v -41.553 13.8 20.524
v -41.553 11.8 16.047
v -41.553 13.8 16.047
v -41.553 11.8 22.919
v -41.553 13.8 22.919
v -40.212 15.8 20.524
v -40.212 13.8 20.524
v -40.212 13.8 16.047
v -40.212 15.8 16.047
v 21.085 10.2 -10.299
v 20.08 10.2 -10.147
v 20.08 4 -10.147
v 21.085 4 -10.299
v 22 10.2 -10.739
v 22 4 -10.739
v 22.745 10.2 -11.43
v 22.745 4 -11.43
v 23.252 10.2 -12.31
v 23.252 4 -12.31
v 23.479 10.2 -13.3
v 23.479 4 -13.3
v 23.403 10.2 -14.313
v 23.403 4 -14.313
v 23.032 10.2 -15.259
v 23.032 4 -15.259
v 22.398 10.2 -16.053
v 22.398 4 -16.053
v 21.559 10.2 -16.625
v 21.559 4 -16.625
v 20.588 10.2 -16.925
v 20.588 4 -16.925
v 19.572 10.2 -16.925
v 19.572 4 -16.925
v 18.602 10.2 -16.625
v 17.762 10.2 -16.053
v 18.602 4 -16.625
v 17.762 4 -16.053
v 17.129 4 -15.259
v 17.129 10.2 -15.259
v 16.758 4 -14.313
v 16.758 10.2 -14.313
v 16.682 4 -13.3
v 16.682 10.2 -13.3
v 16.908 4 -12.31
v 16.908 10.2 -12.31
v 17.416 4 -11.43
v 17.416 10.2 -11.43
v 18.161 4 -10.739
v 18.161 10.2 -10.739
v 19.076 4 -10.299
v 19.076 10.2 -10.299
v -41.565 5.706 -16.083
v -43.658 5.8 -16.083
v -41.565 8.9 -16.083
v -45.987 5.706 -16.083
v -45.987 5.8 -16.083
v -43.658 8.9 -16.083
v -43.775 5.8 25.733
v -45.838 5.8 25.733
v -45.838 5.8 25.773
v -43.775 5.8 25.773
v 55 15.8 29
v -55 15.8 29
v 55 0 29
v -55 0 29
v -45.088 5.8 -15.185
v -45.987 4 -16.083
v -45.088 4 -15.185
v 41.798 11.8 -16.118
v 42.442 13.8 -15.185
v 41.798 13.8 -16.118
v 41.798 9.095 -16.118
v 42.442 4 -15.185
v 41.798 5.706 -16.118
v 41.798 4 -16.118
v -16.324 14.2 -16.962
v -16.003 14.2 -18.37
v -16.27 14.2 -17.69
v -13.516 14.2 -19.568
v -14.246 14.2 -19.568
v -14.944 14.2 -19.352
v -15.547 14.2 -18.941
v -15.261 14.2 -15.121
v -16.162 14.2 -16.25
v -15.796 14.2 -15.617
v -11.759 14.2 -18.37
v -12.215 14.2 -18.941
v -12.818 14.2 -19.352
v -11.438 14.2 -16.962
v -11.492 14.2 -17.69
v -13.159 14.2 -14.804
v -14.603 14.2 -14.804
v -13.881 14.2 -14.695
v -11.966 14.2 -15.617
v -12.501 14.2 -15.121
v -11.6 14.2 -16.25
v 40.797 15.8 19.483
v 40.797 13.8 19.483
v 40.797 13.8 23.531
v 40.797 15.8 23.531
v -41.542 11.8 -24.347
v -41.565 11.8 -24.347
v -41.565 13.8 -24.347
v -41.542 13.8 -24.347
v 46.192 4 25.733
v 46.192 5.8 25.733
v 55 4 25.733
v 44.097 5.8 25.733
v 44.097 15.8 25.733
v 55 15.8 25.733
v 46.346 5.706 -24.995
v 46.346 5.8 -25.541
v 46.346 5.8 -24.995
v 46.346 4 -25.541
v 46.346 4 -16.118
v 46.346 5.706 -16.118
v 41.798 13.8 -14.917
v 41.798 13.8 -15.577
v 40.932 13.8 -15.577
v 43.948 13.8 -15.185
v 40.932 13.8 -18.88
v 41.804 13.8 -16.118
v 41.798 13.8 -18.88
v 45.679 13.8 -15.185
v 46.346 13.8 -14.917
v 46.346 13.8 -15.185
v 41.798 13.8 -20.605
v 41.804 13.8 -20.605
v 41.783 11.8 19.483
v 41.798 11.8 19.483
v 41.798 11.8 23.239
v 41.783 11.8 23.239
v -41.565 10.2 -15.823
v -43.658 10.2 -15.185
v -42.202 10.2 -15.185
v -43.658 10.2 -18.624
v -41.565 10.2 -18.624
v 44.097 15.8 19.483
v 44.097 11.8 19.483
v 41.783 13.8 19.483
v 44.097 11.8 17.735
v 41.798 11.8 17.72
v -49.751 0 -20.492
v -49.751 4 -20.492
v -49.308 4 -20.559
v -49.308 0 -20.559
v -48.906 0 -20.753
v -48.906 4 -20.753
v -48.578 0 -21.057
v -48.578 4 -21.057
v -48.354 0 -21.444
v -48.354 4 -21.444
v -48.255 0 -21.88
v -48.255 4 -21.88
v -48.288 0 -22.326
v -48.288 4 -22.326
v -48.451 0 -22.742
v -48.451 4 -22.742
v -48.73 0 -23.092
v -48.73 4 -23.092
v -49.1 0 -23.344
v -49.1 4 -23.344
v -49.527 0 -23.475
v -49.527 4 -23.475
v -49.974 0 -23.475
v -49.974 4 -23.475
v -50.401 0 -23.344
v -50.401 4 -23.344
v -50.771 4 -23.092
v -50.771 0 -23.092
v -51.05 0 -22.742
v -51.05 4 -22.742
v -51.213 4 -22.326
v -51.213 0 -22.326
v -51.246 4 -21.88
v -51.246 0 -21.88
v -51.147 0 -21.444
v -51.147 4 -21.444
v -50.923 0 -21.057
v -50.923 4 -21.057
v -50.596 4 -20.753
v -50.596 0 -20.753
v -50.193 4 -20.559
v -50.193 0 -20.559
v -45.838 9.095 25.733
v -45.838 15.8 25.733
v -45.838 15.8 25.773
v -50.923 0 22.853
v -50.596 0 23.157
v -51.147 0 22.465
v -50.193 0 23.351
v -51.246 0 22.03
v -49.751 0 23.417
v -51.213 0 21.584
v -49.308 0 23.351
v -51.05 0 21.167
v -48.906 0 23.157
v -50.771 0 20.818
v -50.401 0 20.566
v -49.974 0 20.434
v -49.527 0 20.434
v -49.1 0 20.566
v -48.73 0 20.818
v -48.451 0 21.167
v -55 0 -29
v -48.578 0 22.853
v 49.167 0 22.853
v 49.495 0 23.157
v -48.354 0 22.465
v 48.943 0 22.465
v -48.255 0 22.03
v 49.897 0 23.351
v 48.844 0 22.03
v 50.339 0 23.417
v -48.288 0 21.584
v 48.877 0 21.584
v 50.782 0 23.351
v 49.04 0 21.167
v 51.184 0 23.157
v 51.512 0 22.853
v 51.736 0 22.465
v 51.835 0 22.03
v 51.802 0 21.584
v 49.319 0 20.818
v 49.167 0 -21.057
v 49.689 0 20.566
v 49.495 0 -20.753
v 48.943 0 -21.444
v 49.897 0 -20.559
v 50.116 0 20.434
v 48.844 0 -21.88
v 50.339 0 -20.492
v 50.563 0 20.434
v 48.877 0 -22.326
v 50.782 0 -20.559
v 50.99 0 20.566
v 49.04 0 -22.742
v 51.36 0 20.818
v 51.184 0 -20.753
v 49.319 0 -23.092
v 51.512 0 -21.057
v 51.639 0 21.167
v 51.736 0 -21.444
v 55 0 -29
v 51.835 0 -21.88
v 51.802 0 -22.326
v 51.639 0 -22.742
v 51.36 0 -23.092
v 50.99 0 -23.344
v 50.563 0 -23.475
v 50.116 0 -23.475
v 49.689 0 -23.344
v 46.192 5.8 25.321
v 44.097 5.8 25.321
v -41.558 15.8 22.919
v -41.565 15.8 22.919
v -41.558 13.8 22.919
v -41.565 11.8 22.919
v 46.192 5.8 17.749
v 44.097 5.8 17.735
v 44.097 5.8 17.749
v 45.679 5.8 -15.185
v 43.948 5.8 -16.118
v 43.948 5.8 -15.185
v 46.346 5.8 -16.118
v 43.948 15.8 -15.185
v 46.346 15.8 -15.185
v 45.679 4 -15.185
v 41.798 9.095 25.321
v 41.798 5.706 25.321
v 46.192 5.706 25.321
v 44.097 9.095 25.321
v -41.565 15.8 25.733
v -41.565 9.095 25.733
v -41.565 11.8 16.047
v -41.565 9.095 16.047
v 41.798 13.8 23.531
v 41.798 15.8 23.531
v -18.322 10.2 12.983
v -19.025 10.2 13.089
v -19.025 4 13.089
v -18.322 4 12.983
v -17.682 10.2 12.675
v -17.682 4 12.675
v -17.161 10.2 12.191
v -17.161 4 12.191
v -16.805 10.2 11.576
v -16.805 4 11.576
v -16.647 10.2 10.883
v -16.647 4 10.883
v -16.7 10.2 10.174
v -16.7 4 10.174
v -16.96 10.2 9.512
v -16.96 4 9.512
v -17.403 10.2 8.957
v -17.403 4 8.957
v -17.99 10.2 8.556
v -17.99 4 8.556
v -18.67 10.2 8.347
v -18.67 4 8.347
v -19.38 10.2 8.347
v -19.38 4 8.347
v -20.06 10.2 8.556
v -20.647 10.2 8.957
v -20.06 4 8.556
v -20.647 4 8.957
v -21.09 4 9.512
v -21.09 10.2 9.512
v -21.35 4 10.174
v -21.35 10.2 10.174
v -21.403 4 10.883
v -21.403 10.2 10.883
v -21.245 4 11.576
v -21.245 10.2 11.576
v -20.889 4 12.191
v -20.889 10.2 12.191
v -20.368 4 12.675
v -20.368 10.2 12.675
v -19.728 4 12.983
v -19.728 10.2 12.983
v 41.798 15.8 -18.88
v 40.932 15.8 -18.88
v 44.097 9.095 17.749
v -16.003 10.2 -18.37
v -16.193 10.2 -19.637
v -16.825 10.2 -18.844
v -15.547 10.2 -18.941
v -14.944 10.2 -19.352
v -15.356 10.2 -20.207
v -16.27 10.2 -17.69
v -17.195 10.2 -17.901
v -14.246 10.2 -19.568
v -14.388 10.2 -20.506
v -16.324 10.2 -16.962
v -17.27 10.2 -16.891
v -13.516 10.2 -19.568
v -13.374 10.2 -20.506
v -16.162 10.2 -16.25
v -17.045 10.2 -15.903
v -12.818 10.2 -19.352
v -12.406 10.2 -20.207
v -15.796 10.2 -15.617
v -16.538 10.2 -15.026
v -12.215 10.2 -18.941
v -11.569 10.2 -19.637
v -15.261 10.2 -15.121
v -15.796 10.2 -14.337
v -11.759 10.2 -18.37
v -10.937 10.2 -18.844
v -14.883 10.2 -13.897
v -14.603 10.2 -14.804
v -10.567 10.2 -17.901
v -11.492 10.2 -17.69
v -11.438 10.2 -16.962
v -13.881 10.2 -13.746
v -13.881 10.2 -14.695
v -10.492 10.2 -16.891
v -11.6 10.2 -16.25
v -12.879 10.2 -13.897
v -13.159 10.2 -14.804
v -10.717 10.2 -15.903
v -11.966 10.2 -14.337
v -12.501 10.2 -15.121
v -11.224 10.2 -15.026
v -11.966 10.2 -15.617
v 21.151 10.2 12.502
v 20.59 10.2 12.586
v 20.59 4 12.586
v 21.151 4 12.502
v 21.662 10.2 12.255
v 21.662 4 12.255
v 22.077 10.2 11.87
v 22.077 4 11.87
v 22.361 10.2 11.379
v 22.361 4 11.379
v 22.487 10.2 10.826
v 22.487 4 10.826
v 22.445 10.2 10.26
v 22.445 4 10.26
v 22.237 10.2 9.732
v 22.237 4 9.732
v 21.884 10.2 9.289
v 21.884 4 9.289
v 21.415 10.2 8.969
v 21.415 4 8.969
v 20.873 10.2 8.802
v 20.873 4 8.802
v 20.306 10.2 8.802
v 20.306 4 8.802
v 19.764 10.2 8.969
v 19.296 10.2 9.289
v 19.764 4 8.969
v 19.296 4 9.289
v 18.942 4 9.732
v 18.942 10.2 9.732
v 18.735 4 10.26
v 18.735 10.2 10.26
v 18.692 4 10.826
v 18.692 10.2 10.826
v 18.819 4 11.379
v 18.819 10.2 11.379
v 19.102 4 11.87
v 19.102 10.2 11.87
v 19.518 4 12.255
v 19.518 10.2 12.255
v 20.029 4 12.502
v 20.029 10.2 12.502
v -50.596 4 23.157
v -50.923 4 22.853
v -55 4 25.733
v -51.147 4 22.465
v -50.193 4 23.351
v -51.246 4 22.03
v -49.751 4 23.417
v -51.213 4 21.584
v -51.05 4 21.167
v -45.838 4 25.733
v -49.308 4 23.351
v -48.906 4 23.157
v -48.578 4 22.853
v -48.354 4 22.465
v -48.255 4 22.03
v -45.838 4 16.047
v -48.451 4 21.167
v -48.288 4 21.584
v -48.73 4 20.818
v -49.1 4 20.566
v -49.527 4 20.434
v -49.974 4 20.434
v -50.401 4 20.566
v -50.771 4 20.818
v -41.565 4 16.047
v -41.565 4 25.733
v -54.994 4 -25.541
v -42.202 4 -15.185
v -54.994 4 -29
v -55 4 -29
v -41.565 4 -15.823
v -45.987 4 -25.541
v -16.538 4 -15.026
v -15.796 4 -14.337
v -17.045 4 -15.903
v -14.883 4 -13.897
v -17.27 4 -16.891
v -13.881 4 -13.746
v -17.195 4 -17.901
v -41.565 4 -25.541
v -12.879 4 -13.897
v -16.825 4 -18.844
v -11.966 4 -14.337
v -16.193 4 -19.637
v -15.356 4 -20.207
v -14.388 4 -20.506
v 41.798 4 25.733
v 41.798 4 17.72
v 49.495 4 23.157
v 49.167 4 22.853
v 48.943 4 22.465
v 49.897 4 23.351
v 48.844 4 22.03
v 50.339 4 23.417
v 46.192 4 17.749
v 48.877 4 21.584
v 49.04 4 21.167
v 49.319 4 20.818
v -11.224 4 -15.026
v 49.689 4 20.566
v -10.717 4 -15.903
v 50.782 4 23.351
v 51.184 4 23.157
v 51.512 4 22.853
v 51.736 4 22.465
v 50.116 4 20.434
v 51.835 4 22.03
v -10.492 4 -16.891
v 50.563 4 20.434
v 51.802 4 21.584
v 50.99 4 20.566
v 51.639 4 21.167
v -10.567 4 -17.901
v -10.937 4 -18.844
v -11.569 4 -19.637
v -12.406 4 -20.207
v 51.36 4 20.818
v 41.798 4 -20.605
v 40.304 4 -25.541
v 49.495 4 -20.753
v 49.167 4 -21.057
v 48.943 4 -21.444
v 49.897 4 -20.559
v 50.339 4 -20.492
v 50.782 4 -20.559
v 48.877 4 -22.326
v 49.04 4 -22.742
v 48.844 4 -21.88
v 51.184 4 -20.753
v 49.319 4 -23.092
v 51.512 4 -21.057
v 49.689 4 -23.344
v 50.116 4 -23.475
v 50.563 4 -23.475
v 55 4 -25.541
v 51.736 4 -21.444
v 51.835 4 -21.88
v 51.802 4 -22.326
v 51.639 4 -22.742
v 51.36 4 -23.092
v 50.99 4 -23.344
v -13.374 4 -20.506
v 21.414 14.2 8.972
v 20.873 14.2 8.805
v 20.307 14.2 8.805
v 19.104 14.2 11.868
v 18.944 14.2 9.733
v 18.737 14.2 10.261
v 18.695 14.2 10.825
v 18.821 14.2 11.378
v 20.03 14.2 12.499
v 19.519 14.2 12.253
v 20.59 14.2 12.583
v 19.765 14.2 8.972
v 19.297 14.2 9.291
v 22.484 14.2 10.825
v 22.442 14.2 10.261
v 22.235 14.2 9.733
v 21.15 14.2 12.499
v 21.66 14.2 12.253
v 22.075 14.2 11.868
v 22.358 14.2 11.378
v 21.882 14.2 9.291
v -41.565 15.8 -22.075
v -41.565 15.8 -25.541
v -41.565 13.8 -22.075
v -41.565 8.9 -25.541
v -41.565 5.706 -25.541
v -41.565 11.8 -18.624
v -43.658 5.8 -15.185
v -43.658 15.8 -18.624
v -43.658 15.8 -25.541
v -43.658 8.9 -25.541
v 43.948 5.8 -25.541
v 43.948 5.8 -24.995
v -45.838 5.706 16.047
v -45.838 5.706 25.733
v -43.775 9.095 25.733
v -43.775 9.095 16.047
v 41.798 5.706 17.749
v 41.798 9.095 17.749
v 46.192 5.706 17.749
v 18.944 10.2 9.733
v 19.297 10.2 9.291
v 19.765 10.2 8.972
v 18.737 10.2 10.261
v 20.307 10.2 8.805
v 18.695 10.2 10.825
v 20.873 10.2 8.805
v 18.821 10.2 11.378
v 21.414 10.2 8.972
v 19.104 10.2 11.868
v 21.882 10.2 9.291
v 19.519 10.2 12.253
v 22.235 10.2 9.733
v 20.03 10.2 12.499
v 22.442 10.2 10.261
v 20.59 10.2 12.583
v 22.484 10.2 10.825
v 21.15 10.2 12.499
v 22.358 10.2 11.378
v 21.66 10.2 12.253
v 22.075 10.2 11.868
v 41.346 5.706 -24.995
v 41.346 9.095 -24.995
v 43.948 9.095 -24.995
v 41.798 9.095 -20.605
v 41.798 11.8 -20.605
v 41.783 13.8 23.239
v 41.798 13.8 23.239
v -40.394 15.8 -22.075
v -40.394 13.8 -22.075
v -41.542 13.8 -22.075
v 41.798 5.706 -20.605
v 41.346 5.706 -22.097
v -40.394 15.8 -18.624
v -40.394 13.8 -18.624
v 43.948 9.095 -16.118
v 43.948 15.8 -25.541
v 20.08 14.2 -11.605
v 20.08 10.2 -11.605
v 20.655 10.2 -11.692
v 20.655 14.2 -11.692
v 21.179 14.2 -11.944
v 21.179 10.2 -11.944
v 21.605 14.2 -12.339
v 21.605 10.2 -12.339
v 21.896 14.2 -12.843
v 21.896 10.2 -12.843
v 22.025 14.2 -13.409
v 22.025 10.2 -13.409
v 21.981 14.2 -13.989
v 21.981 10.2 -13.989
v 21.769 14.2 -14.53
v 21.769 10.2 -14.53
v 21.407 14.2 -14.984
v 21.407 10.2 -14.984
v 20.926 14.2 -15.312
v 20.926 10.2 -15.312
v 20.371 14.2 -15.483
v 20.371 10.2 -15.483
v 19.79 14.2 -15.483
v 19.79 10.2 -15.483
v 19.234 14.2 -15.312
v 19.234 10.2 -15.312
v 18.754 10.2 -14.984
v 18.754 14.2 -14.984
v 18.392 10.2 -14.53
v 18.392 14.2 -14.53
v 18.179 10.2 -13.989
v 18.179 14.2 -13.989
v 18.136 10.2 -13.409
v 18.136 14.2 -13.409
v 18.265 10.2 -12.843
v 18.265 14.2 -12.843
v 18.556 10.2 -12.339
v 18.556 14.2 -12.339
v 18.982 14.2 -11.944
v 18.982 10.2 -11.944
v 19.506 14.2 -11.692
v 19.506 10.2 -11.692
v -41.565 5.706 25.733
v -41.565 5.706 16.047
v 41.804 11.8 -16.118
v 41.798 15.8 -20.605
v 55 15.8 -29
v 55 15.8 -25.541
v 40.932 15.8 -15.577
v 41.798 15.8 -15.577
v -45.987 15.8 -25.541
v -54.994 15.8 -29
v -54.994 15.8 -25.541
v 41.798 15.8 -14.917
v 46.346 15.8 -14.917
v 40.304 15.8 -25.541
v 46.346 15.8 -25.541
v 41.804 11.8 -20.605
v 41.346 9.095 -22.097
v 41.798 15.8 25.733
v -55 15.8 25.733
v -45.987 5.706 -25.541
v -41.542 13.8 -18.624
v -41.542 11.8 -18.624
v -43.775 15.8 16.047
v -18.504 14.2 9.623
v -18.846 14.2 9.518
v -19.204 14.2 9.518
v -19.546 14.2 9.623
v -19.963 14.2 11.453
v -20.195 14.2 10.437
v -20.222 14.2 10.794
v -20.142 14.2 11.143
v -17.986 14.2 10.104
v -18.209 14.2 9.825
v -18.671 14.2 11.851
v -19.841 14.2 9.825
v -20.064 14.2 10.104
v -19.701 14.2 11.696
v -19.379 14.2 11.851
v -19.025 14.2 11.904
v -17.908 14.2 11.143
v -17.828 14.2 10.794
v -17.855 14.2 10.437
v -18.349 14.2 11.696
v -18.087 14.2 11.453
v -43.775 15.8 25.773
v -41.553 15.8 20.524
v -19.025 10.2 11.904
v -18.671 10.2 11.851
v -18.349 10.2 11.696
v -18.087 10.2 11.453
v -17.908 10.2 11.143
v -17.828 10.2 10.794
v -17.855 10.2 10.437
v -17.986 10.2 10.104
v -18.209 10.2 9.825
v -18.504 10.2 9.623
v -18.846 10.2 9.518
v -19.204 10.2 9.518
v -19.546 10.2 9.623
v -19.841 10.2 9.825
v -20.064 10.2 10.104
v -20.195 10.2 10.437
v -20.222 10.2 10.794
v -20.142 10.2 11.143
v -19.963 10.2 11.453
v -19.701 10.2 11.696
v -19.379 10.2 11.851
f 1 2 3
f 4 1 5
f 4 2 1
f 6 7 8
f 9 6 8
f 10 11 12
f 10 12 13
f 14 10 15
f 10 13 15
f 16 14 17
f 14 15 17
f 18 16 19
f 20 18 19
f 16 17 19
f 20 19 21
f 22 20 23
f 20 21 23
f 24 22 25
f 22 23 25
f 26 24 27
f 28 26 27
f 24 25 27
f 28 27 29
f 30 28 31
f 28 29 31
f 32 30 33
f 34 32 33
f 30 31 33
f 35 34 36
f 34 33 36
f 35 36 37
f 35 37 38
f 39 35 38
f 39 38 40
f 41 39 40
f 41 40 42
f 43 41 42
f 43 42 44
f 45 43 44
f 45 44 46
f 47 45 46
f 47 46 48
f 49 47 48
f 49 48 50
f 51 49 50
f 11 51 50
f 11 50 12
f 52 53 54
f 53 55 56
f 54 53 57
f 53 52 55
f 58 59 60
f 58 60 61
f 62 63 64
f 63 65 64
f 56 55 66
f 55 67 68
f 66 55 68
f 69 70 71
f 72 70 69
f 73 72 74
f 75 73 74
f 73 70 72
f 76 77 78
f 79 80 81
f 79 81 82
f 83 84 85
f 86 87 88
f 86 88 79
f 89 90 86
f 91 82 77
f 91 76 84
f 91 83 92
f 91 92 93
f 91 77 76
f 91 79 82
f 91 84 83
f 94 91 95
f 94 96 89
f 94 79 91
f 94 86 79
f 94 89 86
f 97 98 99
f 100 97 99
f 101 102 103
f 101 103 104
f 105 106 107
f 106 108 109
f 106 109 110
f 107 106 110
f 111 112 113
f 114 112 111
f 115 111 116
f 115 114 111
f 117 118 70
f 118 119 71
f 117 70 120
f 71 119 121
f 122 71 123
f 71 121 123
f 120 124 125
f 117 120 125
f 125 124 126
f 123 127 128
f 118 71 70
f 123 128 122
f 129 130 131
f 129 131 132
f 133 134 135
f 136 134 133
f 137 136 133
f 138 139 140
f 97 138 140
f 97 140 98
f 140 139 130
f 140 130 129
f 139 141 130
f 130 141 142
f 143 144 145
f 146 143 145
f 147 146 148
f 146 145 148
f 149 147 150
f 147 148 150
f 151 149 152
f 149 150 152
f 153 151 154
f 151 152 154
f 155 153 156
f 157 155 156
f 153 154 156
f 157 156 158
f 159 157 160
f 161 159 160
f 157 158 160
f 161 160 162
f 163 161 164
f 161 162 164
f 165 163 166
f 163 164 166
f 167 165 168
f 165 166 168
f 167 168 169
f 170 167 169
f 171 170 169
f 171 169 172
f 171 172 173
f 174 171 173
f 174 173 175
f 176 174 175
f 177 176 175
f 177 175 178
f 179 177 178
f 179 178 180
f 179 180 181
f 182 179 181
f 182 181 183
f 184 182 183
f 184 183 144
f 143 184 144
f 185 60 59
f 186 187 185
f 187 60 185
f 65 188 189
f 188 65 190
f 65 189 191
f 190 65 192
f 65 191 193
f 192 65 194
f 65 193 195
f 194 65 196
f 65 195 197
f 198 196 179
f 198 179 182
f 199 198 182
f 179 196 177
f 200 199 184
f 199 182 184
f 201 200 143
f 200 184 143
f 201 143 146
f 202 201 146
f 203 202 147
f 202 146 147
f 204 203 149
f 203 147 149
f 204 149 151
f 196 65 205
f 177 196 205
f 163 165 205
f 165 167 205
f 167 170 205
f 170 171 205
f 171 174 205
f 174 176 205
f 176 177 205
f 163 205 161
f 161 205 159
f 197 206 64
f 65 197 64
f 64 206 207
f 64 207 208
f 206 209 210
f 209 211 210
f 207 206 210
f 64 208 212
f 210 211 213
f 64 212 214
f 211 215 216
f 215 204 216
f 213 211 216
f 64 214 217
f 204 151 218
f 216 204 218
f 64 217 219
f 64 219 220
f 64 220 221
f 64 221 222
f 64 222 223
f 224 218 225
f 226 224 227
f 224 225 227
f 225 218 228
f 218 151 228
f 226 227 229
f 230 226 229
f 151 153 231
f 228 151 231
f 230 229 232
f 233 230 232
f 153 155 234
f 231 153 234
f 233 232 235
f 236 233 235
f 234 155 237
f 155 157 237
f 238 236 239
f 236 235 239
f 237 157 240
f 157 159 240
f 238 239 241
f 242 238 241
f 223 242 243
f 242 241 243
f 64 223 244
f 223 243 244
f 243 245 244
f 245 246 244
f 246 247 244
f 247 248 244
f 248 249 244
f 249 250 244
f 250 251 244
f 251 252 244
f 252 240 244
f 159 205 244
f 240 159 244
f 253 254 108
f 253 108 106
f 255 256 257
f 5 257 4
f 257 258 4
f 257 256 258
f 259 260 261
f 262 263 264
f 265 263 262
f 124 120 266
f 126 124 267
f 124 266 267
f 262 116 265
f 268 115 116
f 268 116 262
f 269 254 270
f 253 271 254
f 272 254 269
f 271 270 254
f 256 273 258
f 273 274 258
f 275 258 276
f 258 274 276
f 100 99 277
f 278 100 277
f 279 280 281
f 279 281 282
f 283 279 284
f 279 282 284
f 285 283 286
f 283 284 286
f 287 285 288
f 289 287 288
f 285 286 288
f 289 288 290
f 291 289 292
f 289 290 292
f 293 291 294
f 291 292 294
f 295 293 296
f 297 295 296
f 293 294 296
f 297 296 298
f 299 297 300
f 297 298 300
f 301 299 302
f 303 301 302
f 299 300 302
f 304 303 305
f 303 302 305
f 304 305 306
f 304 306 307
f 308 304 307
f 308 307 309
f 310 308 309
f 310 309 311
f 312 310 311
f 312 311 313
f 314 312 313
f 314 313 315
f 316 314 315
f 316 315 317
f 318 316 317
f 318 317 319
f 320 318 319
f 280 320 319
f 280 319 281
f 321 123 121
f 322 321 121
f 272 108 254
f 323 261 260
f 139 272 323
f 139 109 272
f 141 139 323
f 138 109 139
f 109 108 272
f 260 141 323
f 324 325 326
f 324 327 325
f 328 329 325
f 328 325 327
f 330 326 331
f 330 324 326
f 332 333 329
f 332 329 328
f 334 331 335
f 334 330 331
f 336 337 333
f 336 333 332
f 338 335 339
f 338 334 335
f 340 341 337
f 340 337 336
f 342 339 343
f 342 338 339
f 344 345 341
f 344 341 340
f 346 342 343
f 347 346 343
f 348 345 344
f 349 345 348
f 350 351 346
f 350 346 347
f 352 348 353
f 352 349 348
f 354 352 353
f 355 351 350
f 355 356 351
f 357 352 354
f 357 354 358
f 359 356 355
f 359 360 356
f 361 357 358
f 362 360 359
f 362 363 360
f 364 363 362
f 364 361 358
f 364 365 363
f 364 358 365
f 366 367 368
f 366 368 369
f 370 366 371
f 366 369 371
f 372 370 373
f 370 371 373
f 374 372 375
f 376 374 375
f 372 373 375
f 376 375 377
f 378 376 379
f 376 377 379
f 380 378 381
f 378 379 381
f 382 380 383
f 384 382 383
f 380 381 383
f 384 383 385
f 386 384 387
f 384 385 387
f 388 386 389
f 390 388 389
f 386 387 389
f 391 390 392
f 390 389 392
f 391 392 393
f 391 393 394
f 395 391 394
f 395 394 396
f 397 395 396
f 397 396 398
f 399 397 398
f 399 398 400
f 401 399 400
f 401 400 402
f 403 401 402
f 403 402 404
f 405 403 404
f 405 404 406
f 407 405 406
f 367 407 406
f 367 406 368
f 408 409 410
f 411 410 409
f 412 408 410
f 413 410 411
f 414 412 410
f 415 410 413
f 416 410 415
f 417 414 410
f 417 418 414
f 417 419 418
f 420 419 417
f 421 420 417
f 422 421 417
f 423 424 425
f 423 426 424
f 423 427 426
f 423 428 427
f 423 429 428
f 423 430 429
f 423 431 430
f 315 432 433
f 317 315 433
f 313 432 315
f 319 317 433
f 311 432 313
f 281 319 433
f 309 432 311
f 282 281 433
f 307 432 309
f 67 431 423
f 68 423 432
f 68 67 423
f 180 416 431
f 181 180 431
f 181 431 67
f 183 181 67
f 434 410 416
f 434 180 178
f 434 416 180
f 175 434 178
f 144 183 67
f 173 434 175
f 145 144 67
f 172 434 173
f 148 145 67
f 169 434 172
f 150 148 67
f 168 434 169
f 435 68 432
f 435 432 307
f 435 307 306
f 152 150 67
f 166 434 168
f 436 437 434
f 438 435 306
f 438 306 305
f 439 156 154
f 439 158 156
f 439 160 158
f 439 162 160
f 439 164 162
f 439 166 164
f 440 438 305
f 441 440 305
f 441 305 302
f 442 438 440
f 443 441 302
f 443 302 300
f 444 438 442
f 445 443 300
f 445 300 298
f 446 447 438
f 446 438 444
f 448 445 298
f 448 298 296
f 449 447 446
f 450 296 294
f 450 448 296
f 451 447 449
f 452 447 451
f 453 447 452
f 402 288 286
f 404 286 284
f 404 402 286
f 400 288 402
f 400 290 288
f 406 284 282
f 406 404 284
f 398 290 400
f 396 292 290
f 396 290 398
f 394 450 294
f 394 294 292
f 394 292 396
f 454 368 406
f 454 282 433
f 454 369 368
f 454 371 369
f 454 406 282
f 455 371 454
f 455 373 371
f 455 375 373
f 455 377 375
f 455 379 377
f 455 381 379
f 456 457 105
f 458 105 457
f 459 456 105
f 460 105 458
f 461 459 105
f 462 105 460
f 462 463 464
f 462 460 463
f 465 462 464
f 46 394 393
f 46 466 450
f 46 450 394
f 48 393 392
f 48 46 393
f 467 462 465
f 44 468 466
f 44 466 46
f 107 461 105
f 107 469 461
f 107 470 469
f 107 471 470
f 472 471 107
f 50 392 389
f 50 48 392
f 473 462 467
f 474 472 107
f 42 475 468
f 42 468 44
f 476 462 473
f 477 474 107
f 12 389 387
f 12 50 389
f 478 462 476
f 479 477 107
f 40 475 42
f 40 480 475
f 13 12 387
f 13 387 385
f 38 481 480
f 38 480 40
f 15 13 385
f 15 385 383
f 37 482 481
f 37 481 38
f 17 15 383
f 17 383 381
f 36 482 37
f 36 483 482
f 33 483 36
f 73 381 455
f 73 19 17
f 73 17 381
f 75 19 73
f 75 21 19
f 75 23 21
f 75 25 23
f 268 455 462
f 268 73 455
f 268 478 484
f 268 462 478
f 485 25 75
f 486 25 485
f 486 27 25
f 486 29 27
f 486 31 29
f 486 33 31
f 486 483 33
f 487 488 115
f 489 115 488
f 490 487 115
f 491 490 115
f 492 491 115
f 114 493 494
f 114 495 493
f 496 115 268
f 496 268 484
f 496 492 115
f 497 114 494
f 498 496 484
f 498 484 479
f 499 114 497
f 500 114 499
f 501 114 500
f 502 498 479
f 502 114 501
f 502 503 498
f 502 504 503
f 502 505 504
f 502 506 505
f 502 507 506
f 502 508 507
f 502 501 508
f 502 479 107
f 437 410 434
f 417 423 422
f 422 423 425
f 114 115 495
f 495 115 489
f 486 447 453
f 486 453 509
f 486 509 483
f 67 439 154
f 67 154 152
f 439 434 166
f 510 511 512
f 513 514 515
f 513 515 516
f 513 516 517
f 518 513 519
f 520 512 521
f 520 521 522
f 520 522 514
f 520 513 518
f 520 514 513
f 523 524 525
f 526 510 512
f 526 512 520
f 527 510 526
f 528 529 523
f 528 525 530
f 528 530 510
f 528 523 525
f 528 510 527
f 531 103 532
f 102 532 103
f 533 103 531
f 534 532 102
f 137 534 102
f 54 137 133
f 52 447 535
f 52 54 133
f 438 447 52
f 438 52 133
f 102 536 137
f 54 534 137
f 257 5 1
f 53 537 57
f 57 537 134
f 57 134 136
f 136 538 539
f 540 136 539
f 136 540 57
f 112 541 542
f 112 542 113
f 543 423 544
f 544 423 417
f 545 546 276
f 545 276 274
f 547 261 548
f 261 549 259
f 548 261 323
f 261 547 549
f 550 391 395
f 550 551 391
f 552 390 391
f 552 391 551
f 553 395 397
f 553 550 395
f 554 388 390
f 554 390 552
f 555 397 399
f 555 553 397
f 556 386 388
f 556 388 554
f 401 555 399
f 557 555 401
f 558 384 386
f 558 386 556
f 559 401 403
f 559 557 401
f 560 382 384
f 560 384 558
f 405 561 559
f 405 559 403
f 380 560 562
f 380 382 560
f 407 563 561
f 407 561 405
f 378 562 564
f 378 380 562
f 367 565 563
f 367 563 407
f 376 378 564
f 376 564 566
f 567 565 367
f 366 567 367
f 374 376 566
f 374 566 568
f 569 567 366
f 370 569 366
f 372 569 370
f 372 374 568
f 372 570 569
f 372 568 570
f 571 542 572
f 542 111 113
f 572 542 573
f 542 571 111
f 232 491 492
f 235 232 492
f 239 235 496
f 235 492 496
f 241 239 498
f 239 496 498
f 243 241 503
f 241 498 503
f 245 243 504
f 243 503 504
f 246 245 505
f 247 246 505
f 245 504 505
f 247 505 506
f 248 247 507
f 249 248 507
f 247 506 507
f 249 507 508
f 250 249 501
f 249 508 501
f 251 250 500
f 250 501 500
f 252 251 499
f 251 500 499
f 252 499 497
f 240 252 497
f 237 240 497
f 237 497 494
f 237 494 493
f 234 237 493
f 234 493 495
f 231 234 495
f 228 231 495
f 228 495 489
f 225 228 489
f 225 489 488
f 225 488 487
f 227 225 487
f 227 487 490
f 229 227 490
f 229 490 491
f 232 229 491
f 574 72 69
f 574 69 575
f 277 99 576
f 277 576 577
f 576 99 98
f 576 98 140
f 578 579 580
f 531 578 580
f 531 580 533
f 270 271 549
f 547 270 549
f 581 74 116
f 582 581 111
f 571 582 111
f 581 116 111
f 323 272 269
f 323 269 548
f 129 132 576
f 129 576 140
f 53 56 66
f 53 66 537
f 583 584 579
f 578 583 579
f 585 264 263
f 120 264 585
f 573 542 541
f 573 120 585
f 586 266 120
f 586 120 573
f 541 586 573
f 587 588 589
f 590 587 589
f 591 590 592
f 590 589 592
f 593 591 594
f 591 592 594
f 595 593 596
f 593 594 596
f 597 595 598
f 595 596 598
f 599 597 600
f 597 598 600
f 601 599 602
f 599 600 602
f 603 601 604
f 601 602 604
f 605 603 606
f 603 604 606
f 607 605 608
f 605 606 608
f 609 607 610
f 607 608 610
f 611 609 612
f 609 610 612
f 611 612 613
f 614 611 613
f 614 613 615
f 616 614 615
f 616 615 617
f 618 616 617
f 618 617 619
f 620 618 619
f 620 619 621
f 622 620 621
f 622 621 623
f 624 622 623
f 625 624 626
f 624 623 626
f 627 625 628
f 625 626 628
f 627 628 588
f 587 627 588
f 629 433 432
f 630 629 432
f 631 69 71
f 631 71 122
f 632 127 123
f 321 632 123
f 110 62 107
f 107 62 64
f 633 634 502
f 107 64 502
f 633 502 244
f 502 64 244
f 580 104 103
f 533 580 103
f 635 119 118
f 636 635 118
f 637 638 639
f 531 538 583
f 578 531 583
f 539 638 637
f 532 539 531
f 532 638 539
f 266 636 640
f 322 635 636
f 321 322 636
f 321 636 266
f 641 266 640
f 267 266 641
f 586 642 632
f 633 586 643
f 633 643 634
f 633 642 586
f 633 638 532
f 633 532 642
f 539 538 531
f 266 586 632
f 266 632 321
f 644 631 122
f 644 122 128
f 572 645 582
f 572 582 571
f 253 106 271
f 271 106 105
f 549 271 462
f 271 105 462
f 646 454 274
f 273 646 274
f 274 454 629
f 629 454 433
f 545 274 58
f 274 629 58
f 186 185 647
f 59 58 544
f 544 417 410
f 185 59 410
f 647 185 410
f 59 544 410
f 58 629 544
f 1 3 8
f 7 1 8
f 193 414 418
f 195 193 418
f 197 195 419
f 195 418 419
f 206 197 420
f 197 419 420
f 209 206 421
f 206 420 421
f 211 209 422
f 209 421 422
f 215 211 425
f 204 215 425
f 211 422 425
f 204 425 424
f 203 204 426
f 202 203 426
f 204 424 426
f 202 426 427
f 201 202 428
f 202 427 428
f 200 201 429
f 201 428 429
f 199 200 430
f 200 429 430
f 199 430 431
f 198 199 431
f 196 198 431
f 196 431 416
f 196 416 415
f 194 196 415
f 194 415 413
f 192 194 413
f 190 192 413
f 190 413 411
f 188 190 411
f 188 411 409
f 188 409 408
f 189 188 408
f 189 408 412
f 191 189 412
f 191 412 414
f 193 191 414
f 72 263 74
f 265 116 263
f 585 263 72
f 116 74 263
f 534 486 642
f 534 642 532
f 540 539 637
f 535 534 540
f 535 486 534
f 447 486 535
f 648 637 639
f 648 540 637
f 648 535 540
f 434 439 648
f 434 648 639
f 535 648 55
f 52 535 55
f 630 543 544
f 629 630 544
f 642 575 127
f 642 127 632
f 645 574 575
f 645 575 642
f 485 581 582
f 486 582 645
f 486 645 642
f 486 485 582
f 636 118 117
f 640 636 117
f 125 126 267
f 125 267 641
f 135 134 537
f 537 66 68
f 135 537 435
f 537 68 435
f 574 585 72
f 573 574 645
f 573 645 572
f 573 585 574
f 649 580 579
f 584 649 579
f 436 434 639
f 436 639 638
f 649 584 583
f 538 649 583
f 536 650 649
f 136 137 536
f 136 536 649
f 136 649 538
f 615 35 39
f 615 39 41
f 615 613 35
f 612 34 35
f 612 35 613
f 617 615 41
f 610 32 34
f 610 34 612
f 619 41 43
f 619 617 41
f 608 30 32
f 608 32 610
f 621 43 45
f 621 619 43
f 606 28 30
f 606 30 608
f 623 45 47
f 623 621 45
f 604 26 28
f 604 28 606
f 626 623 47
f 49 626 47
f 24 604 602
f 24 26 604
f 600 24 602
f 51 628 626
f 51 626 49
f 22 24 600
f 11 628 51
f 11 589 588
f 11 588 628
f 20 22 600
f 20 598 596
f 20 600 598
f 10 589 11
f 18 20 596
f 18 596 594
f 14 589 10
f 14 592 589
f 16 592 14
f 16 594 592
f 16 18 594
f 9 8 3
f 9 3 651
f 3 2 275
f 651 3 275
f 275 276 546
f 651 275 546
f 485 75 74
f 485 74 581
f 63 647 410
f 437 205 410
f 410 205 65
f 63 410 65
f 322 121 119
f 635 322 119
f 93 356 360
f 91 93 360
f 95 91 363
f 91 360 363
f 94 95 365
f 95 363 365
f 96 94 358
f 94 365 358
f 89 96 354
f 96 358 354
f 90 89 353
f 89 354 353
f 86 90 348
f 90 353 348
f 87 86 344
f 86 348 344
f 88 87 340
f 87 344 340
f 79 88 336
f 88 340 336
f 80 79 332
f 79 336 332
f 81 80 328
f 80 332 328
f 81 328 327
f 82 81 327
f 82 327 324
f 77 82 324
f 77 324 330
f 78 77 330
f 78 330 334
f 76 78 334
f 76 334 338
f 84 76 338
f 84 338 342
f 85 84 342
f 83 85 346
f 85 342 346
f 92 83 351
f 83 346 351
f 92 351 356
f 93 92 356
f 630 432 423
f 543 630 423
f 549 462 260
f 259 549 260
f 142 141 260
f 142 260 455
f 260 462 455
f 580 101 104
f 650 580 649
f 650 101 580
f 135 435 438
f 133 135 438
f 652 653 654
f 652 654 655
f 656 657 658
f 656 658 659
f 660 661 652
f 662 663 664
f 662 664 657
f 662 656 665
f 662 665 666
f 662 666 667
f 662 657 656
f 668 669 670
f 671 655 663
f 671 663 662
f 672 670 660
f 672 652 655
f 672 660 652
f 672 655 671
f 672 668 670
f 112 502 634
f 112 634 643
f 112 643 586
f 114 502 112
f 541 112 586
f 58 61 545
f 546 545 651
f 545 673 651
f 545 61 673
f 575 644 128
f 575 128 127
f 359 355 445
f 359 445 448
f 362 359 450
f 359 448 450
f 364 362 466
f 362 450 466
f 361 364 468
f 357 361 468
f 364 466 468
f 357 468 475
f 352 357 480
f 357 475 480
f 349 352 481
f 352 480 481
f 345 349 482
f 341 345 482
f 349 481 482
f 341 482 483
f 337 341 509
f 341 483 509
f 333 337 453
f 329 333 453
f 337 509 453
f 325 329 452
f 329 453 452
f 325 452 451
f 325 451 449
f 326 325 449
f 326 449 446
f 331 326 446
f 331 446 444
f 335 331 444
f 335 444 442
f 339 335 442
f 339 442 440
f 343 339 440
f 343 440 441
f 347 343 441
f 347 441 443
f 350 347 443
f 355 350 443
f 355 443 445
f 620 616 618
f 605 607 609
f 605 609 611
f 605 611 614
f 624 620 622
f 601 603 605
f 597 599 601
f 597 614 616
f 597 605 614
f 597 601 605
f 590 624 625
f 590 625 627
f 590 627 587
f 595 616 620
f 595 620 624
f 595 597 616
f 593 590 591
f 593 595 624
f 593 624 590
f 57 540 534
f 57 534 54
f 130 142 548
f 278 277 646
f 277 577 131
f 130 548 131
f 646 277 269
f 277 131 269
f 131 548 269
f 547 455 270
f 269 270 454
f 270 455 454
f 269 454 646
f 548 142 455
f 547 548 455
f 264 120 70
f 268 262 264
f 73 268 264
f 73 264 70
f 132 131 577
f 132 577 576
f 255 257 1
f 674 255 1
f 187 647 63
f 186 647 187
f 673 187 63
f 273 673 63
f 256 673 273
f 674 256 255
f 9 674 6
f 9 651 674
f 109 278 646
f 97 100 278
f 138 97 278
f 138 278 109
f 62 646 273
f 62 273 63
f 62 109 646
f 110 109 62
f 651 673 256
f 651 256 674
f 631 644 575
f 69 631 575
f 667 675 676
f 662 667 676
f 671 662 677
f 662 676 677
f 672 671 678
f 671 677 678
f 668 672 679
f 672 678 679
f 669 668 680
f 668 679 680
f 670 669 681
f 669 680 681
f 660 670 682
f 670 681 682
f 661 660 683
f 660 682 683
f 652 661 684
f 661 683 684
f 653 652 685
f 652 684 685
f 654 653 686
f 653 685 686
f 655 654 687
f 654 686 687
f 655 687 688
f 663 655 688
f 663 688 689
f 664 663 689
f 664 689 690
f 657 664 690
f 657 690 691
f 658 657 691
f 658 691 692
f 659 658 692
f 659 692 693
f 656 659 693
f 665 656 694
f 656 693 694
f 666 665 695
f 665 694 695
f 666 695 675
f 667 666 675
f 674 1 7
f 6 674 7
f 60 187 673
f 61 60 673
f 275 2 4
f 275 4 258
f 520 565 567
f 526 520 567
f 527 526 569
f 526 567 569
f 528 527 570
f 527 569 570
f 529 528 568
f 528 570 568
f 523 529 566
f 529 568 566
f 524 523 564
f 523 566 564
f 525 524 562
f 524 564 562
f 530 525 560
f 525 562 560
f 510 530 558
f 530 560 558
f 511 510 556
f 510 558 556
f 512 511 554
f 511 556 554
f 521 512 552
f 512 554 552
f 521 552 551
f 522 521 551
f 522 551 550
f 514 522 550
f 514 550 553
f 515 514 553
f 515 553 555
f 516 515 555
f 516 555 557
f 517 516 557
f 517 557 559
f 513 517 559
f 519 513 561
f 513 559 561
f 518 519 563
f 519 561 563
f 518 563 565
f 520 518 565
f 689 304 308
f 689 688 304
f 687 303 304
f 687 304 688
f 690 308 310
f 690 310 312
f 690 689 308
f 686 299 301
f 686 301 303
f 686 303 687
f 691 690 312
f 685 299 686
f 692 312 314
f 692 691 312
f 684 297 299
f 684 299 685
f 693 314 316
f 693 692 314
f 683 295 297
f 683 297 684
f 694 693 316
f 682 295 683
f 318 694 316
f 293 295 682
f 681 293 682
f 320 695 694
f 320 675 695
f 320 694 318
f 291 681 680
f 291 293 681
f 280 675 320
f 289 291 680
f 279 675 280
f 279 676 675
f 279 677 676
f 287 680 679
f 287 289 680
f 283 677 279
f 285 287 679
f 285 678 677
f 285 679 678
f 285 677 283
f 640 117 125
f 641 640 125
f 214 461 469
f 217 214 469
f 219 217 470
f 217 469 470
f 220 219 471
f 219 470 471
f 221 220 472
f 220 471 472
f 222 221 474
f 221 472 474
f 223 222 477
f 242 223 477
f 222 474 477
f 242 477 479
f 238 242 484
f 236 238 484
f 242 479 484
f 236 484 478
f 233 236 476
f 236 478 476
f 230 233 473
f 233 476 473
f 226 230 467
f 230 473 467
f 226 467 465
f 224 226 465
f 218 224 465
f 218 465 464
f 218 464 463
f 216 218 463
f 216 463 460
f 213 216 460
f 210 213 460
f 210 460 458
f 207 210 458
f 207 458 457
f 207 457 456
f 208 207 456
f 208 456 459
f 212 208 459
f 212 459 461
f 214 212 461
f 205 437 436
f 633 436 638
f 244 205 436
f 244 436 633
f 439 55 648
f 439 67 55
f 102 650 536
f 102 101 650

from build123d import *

# Parameters (mm, degrees)
SKETCH1_W            = 110
SKETCH1_H            = 58
BOSS_EXTRUDE1_DEPTH  = 4
SKETCH2_R            = 3.398974158
SKETCH2_R_2          = 3.407761536
SKETCH2_R_3          = 1.902710934
SKETCH2_R_4          = 2.384440654
BOSS_EXTRUDE2_DEPTH  = 1.6
BOSS_EXTRUDE3_DEPTH  = 6.2
SKETCH4_R            = 2.45
SKETCH4_R_2          = 1.95
SKETCH4_R_3          = 1.9
SKETCH4_R_4          = 1.2
BOSS_EXTRUDE4_DEPTH  = 4
BOSS_EXTRUDE5_DEPTH  = 1.6
BOSS_EXTRUDE7_DEPTH  = 2
SKETCH10_W           = 9.685953709
SKETCH10_H           = 3.389605022
CUT_EXTRUDE1_DEPTH   = 5
SKETCH11_W           = 9.457855186
SKETCH11_H           = 3.19445865
CUT_EXTRUDE2_DEPTH   = 5
SKETCH12_W           = 7.571734997
SKETCH12_H           = 3.389605022
CUT_EXTRUDE3_DEPTH   = 5
SKETCH13_W           = 8.877658174
SKETCH13_H           = 3.389605022
CUT_EXTRUDE4_DEPTH   = 5
BOSS_EXTRUDE11_DEPTH = 2
SKETCH15_W           = 2.328463334
SKETCH15_H           = 10.356170305
SKETCH15_W_2         = 2.062506364
SKETCH15_H_2         = 9.72645826
SKETCH15_W_3         = 2.09471635
SKETCH15_H_3         = 7.99735701
SKETCH15_W_4         = 2.398553281
CUT_EXTRUDE5_DEPTH   = 10
SKETCH16_R           = 1.5
CUT_EXTRUDE9_DEPTH   = 5


with BuildPart() as part:
    # Sketch1 → Boss-Extrude1 (new body)
    with BuildSketch(Plane(origin=(0, 0, 0), x_dir=(1, 0, 0), z_dir=(0, 1, 0))):
        Rectangle(SKETCH1_W, SKETCH1_H)
    extrude(amount=BOSS_EXTRUDE1_DEPTH)

    # Sketch2 → Boss-Extrude2 (add)
    with BuildSketch(Plane(origin=(0, 4, 0), x_dir=(1, 0, 0), z_dir=(0, 1, 0))):
        Polygon((46.346119795, 25.541263413), (55, 25.541263413), (55, 29), (-54.994341331, 29), (-54.994341331, 25.541263413), (-45.986579734, 25.541263413), (-45.986579734, 18.10232226), (-45.986579734, 17.980527053), (-45.986579734, 16.083408227), (-45.088264615, 15.185093108), (-42.202263878, 15.185093108), (-41.564501972, 15.822855015), (-41.564501972, 18.10232226), (-41.564501972, 25.541263413), (40.304214547, 25.541263413), (41.797555033, 20.604809993), (41.797555033, 16.117567037), (42.441634266, 15.185093108), (45.678891317, 15.185093108), (46.346119795, 16.117567037), align=None)
        with Locations(Location((-13.880988948, 17.14491543, 0), (0, 0, 270))):
            Circle(SKETCH2_R)
        with Locations(Location((20.080301926, 13.55493457, 0), (0, 0, 270))):
            Circle(SKETCH2_R_2)
        with Locations(Location((20.58969132, -10.683370151, 0), (0, 0, 270))):
            Circle(SKETCH2_R_3)
        with Locations(Location((-19.024959871, -10.704463559, 0), (0, 0, 270))):
            Circle(SKETCH2_R_4)
        Polygon((-55, -25.732689432), (-55, -29), (55, -29), (55, -25.732689432), (46.191771323, -25.732689432), (46.191771323, -17.749211072), (41.797555033, -17.720096968), (41.797555033, -25.732689432), (-41.564501972, -25.732689432), (-41.564501972, -19.505766322), (-41.564501972, -16.046735723), (-45.837931694, -16.046735723), (-45.837931694, -19.079806126), (-45.837931694, -25.732689432), (-46.135227773, -25.732689432), align=None)
    extrude(amount=BOSS_EXTRUDE2_DEPTH)

    # Sketch2 → Boss-Extrude3 (add)
    with BuildSketch(Plane(origin=(0, 4, 0), x_dir=(1, 0, 0), z_dir=(0, 1, 0))):
        Polygon((46.346119795, 25.541263413), (55, 25.541263413), (55, 29), (-54.994341331, 29), (-54.994341331, 25.541263413), (-45.986579734, 25.541263413), (-45.986579734, 18.10232226), (-45.986579734, 17.980527053), (-45.986579734, 16.083408227), (-45.088264615, 15.185093108), (-42.202263878, 15.185093108), (-41.564501972, 15.822855015), (-41.564501972, 18.10232226), (-41.564501972, 25.541263413), (40.304214547, 25.541263413), (41.797555033, 20.604809993), (41.797555033, 16.117567037), (42.441634266, 15.185093108), (45.678891317, 15.185093108), (46.346119795, 16.117567037), align=None)
        with Locations(Location((-13.880988948, 17.14491543, 0), (0, 0, 270))):
            Circle(SKETCH2_R)
        with Locations(Location((20.080301926, 13.55493457, 0), (0, 0, 270))):
            Circle(SKETCH2_R_2)
        with Locations(Location((20.58969132, -10.683370151, 0), (0, 0, 270))):
            Circle(SKETCH2_R_3)
        with Locations(Location((-19.024959871, -10.704463559, 0), (0, 0, 270))):
            Circle(SKETCH2_R_4)
        Polygon((-55, -25.732689432), (-55, -29), (55, -29), (55, -25.732689432), (46.191771323, -25.732689432), (46.191771323, -17.749211072), (41.797555033, -17.720096968), (41.797555033, -25.732689432), (-41.564501972, -25.732689432), (-41.564501972, -19.505766322), (-41.564501972, -16.046735723), (-45.837931694, -16.046735723), (-45.837931694, -19.079806126), (-45.837931694, -25.732689432), (-46.135227773, -25.732689432), align=None)
    extrude(amount=BOSS_EXTRUDE3_DEPTH)

    # Sketch4 → Boss-Extrude4 (add)
    with BuildSketch(Plane(origin=(0, 10.2, 0), x_dir=(1, 0, 0), z_dir=(0, 1, 0))):
        with Locations(Location((-13.880988948, 17.14491543, 0), (0, 0, 270))):
            Circle(SKETCH4_R)
        with Locations(Location((20.080301926, 13.55493457, 0), (0, 0, 270))):
            Circle(SKETCH4_R_2)
        with Locations(Location((20.58969132, -10.683370151, 0), (0, 0, 270))):
            Circle(SKETCH4_R_3)
        with Locations(Location((-19.024959871, -10.704463559, 0), (0, 0, 270))):
            Circle(SKETCH4_R_4)
    extrude(amount=BOSS_EXTRUDE4_DEPTH)

    # Sketch5 → Boss-Extrude5 (add)
    with BuildSketch(Plane(origin=(0, 10.2, 0), x_dir=(1, 0, 0), z_dir=(0, 1, 0))):
        Polygon((-54.994341331, 25.541263413), (-54.994341331, 29), (55, 29), (55, 25.541263413), (46.346119795, 25.541263413), (46.346119795, 16.117567037), (45.678891317, 15.185093108), (42.441634266, 15.185093108), (41.797555033, 16.117567037), (41.797555033, 20.604809993), (40.304214547, 25.541263413), (-41.564501972, 25.541263413), (-41.564501972, 18.624421299), (-45.986579734, 18.624421299), (-45.986579734, 25.541263413), align=None)
        Polygon((-55, -29), (-55, -25.732689432), (-45.837931694, -25.732689432), (-45.837931694, -16.046735723), (-41.564501972, -16.046735723), (-41.564501972, -25.732689432), (41.797555033, -25.732689432), (41.797555033, -17.720096968), (46.191771323, -17.749211072), (46.191771323, -25.732689432), (55, -25.732689432), (55, -29), align=None)
    extrude(amount=BOSS_EXTRUDE5_DEPTH)

    # Sketch8 → Boss-Extrude7 (add)
    with BuildSketch(Plane(origin=(0, 11.8, 0), x_dir=(1, 0, 0), z_dir=(0, 1, 0))):
        Polygon((-45.986579734, 25.541263413), (-54.994341331, 25.541263413), (-54.994341331, 29), (55, 29), (55, 25.541263413), (46.346119795, 25.541263413), (46.346119795, 16.117567037), (45.678891317, 15.185093108), (42.441634266, 15.185093108), (41.797555033, 16.117567037), (41.80446192, 16.117567037), (41.80446192, 20.605491868), (41.797555033, 20.604809993), (40.304214547, 25.541263413), (-41.564501972, 25.541263413), (-41.564501972, 24.347016348), (-41.542415728, 24.347016348), (-41.542415728, 18.624421299), (-45.986579734, 18.624421299), align=None)
        Polygon((-55, -29), (-55, -25.732689432), (-45.837931694, -25.732689432), (-45.837931694, -16.046735723), (-41.564501972, -16.046735723), (-41.553155446, -16.046735723), (-41.553155446, -22.919153082), (-41.564501972, -22.919153082), (-41.564501972, -25.732689432), (41.797555033, -25.732689432), (41.797555033, -23.239047925), (41.783488135, -23.239047925), (41.783488135, -19.482944402), (46.191771323, -19.482944402), (46.191771323, -25.732689432), (55, -25.732689432), (55, -29), align=None)
    extrude(amount=BOSS_EXTRUDE7_DEPTH)

    # Sketch10 → Cut-Extrude1 (cut)
    with BuildSketch(Plane.ZY.offset(45.837931694)):
        with Locations((20.889712577, 7.400343861)):
            Rectangle(SKETCH10_W, SKETCH10_H)
    extrude(amount=-CUT_EXTRUDE1_DEPTH, mode=Mode.SUBTRACT)

    # Sketch11 → Cut-Extrude2 (cut)
    with BuildSketch(Plane.ZY.offset(45.986579734)):
        with Locations((-20.81233582, 7.302770675)):
            Rectangle(SKETCH11_W, SKETCH11_H)
    extrude(amount=-CUT_EXTRUDE2_DEPTH, mode=Mode.SUBTRACT)

    # Sketch12 → Cut-Extrude3 (cut)
    with BuildSketch(Plane(origin=(46.191771323, 0, 0), x_dir=(0, 0, -1), z_dir=(1, 0, 0))):
        with Locations((-21.535078571, 7.400343861)):
            Rectangle(SKETCH12_W, SKETCH12_H)
    extrude(amount=-CUT_EXTRUDE3_DEPTH, mode=Mode.SUBTRACT)

    # Sketch13 → Cut-Extrude4 (cut)
    with BuildSketch(Plane(origin=(46.346119795, 0, 0), x_dir=(0, 0, -1), z_dir=(1, 0, 0))):
        with Locations((20.556396124, 7.400343861)):
            Rectangle(SKETCH13_W, SKETCH13_H)
    extrude(amount=-CUT_EXTRUDE4_DEPTH, mode=Mode.SUBTRACT)

    # Sketch14 → Boss-Extrude11 (add)
    with BuildSketch(Plane(origin=(0, 13.8, 0), x_dir=(1, 0, 0), z_dir=(0, 1, 0))):
        Polygon((-55, -25.732689432), (-55, -29), (55, -29), (55, -25.732689432), (46.191771323, -25.732689432), (46.191771323, -19.482944402), (40.796637058, -19.482944402), (40.796637058, -23.53105864), (41.797555033, -23.53105864), (41.797555033, -25.732689432), (-41.564501972, -25.732689432), (-41.564501972, -22.919153082), (-41.558372671, -22.919153082), (-41.553155446, -20.524286948), (-40.212145481, -20.524286948), (-40.212145481, -16.046735723), (-45.837931694, -16.046735723), (-45.837931694, -25.732689432), align=None)
        Polygon((55, 29), (-54.994341331, 29), (-54.994341331, 25.541263413), (-45.986579734, 25.541263413), (-45.986579734, 18.624421299), (-40.393969825, 18.624421299), (-40.393969825, 22.074882647), (-41.564501972, 22.074882647), (-41.564501972, 25.541263413), (40.304214547, 25.541263413), (41.797555033, 20.604809993), (41.797555033, 18.88036778), (40.93151342, 18.88036778), (40.93151342, 15.577482073), (41.797555033, 15.577482073), (41.797555033, 14.916904931), (46.346119795, 14.916904931), (46.346119795, 25.541263413), (55, 25.541263413), align=None)
    extrude(amount=BOSS_EXTRUDE11_DEPTH)

    # Sketch15 → Cut-Extrude5 (cut)
    with BuildSketch(Plane(origin=(0, 15.8, 0), x_dir=(1, 0, 0), z_dir=(0, 1, 0))):
        with Locations((-44.822348067, 20.36317826)):
            Rectangle(SKETCH15_W, SKETCH15_H)
        with Locations((-44.806678512, -20.909964853)):
            Rectangle(SKETCH15_W_2, SKETCH15_H_2)
        with Locations((45.144413148, -21.734010927)):
            Rectangle(SKETCH15_W_3, SKETCH15_H_3)
        with Locations((45.146843155, 20.36317826)):
            Rectangle(SKETCH15_W_4, SKETCH15_H)
    extrude(amount=-CUT_EXTRUDE5_DEPTH, mode=Mode.SUBTRACT)

    # Sketch16 → Cut-Extrude9 (cut)
    with BuildSketch(Plane(origin=(0, 4, 0), x_dir=(1, 0, 0), z_dir=(0, 1, 0))):
        with Locations(Location((-49.750520398, -21.917426264, 0), (0, 0, 270))):
            Circle(SKETCH16_R)
        with Locations(Location((-49.750520398, 21.99224412, 0), (0, 0, 270))):
            Circle(SKETCH16_R)
        with Locations(Location((50.339499411, -21.917426264, 0), (0, 0, 270))):
            Circle(SKETCH16_R)
        with Locations(Location((50.339499411, 21.99224412, 0), (0, 0, 270))):
            Circle(SKETCH16_R)
    extrude(amount=-CUT_EXTRUDE9_DEPTH, mode=Mode.SUBTRACT)


solid = part.part
